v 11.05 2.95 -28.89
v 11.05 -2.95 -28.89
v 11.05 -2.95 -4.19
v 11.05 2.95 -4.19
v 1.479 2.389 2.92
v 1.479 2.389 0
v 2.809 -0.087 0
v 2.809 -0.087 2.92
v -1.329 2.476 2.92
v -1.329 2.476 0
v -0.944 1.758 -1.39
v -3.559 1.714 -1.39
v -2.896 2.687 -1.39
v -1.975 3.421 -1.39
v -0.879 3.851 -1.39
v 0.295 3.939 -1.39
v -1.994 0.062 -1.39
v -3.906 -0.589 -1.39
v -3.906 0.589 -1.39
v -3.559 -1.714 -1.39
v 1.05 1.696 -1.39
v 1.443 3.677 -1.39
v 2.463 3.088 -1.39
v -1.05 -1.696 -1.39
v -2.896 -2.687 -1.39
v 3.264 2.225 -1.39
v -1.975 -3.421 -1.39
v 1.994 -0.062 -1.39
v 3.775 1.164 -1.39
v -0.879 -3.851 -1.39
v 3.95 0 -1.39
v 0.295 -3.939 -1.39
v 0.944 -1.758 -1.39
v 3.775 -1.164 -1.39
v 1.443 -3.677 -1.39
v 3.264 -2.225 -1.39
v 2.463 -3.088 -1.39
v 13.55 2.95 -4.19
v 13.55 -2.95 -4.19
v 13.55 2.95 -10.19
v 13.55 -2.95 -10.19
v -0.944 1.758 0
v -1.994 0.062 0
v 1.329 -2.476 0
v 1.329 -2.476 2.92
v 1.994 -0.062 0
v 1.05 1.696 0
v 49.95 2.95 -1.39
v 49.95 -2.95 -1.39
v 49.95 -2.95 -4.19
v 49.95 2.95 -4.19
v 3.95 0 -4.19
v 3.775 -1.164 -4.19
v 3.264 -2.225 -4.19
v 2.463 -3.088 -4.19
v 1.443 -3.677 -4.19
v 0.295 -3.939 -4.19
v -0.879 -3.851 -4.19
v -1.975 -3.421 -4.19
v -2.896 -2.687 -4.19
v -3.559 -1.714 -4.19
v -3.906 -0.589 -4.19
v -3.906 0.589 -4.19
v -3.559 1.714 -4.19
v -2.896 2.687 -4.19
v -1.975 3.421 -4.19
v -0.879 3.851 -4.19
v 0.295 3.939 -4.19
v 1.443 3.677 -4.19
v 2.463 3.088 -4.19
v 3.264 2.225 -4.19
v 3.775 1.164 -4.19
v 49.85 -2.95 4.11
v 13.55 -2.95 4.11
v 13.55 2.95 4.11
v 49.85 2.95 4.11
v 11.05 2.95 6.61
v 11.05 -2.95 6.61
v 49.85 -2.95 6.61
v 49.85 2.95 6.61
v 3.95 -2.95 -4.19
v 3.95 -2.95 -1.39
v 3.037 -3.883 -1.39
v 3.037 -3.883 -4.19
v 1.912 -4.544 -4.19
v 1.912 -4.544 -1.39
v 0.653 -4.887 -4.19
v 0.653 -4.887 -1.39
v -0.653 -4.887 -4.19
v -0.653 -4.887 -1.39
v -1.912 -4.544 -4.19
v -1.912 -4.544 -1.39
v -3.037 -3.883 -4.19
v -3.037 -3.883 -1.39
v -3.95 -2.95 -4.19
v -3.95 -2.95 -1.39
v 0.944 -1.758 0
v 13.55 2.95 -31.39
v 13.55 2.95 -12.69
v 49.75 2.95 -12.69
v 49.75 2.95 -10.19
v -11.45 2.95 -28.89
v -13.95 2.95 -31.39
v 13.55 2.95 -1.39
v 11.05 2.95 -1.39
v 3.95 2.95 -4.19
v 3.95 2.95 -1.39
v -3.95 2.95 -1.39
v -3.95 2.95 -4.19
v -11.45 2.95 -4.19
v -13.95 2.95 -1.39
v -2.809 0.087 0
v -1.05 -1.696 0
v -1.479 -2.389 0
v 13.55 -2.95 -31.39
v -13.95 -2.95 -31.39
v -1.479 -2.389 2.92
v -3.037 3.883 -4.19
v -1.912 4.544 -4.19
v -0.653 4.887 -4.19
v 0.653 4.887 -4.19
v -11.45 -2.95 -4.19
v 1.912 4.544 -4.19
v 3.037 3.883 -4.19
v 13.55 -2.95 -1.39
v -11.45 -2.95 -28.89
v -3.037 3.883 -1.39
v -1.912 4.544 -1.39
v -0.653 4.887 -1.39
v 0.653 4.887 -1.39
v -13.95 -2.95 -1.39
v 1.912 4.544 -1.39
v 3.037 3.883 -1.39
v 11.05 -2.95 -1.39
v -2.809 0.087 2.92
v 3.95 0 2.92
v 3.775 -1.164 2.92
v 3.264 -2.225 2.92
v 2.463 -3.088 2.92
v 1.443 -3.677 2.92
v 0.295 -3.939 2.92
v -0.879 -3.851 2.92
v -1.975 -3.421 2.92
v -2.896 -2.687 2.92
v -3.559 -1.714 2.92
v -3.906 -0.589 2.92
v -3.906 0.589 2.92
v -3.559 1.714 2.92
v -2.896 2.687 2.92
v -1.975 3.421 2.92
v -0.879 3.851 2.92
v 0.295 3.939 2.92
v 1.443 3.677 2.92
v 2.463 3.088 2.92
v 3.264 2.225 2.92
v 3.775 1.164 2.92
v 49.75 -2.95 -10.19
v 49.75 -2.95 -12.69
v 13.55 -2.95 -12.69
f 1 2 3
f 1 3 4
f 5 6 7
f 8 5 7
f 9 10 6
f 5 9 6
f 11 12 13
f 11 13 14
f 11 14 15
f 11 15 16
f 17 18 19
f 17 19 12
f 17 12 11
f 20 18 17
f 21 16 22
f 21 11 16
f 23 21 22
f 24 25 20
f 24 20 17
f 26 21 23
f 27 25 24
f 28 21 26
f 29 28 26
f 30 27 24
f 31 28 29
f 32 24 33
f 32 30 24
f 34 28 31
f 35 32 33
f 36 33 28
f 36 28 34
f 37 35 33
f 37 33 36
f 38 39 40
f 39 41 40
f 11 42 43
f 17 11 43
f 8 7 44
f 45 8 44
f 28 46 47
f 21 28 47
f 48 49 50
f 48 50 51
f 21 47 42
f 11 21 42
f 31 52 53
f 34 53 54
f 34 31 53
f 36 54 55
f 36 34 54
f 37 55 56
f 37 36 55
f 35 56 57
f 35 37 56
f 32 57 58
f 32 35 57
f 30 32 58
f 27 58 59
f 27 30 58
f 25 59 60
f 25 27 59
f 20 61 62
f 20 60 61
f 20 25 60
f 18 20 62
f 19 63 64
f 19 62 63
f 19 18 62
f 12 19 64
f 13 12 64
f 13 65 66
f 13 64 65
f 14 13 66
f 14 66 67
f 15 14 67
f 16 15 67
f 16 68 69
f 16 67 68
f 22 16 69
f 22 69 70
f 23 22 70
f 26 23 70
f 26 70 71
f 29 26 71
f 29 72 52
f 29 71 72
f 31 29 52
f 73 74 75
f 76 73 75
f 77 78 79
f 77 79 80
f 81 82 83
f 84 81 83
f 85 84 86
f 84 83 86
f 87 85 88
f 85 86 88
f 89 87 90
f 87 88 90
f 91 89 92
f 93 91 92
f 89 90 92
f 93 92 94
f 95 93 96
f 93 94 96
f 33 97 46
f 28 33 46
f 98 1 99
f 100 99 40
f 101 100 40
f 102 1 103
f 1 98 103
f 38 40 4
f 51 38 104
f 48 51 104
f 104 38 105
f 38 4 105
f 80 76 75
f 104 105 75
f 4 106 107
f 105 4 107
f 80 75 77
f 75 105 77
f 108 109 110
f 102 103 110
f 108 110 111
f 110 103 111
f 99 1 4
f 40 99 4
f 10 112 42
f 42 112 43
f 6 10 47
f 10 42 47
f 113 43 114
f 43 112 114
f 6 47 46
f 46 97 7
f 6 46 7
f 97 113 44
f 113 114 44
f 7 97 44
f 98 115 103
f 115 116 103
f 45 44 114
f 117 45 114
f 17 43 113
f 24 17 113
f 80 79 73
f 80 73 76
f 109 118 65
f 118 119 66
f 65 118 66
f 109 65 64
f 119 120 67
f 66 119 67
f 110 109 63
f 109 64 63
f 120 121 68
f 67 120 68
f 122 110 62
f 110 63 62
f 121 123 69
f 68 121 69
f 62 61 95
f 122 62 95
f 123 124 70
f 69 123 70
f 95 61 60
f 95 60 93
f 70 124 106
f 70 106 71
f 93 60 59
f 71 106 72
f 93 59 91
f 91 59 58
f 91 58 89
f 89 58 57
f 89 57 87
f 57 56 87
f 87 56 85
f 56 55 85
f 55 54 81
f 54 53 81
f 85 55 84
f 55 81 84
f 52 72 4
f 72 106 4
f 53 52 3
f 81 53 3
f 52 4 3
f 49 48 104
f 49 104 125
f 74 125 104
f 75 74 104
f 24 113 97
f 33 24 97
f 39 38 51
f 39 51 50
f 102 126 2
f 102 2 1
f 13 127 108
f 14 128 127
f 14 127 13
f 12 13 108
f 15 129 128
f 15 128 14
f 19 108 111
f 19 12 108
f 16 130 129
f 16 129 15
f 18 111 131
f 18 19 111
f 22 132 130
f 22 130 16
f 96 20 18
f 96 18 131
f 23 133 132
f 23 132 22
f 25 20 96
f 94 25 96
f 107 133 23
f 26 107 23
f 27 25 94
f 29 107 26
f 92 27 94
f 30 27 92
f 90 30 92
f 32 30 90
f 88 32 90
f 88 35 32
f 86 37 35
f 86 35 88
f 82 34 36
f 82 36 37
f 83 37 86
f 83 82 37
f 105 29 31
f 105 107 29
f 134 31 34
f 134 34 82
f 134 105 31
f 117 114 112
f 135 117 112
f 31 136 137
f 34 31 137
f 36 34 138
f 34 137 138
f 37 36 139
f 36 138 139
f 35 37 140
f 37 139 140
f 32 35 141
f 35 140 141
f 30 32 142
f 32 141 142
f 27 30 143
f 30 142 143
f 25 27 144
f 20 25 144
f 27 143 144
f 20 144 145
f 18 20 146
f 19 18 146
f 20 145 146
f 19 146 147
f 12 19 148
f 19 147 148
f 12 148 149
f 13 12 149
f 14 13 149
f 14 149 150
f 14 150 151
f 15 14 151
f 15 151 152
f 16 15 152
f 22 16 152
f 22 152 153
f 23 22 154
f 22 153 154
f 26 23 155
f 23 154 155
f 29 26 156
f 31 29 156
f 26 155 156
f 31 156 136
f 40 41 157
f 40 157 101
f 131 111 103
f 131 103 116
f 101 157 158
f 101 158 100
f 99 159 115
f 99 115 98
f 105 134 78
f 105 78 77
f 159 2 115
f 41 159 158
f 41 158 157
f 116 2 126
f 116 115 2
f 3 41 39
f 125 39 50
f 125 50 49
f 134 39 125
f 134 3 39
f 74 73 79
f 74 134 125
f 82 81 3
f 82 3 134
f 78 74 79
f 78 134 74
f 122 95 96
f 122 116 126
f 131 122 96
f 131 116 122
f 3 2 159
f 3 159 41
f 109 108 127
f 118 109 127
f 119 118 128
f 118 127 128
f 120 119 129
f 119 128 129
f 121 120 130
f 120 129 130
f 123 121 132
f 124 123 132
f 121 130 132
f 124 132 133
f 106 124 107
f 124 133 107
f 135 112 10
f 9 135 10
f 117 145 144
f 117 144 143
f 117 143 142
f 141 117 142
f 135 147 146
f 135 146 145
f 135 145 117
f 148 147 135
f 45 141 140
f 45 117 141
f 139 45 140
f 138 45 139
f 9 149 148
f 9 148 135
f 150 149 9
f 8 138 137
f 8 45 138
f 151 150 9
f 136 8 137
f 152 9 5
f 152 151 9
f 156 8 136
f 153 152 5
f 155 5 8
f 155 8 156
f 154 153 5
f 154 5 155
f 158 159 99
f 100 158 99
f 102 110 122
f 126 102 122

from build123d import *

# Parameters (mm, degrees)
F0_R      = 3.95
F1_DEPTH  = 2.92
F2_R      = 3.95
F3_DEPTH  = 3.91
F4_DEPTH  = 2.52
F5_R      = 4.93
F5_R_2    = 3.95
F6_DEPTH  = 2.8
F7_DEPTH  = 25
F12_W     = 5.8999661016
F12_H     = 2.8
F13_DEPTH = 46
F14_W     = 5.8999661016
F14_H     = 2.8
F15_DEPTH = 7.5
F16_W     = 5.8999661016
F16_H     = 30
F17_DEPTH = 2.5
F18_W     = 5.8999661016
F18_H     = 2.5
F19_DEPTH = 25
F20_W     = 2.5
F20_H     = 5.8999661016
F21_DEPTH = 25.7
F22_W     = 5.8999661016
F22_H     = 2.5
F23_DEPTH = 36.2
F24_W     = 2.5
F24_H     = 5.8999661016
F25_DEPTH = 8
F26_W     = 5.8999661016
F26_H     = 2.5
F27_DEPTH = 36.3


with BuildPart() as f1:
    # F0 (on Top) → F1 (new body)
    with BuildSketch(Plane.XY):
        Circle(F0_R)
        Polygon((-1.3292084984, 2.4757432758), (1.4794523209, 2.3889999645), (2.8086608193, -0.0867433114), (1.3292084984, -2.4757432758), (-1.4794523209, -2.3889999645), (-2.8086608193, 0.0867433114), align=None, mode=Mode.SUBTRACT)
    extrude(amount=F1_DEPTH)

    # F2 (on face) → F3 (join)
    with BuildSketch(Plane(origin=(0, 0, 0), x_dir=(1, 0, 0), z_dir=(0, 0, -1))):
        Circle(F2_R)
        Polygon((-1.4794523209, 2.3889999645), (1.3292084984, 2.4757432758), (2.8086608193, 0.0867433114), (1.4794523209, -2.3889999645), (-1.3292084984, -2.4757432758), (-2.8086608193, -0.0867433114), align=None, mode=Mode.SUBTRACT)
        Polygon((2.8086608193, 0.0867433114), (1.3292084984, 2.4757432758), (-1.4794523209, 2.3889999645), (-2.8086608193, -0.0867433114), (-1.3292084984, -2.4757432758), (1.4794523209, -2.3889999645), align=None)
        Polygon((-1.0503584983, 1.696104957), (0.9436907311, 1.7576896211), (1.9940492294, 0.0615846641), (1.0503584983, -1.696104957), (-0.9436907311, -1.7576896211), (-1.9940492294, -0.0615846641), align=None, mode=Mode.SUBTRACT)
    extrude(amount=F3_DEPTH)

    # F4 (cut): a face of the model
    f4_faces = [f1.faces().sort_by_distance(p)[0] for p in [
        (-3.8382771286, 0, -3.91),
    ]]
    extrude(f4_faces, amount=-F4_DEPTH, mode=Mode.SUBTRACT)

    # F5 (on face) → F6 (join)
    with BuildSketch(Plane(origin=(0, 0, -1.39), x_dir=(1, 0, 0), z_dir=(0, 0, -1))):
        Circle(F5_R)
        Circle(F5_R_2, mode=Mode.SUBTRACT)
    extrude(amount=F6_DEPTH)

    # F5 (on face) → F7 (cut)
    with BuildSketch(Plane(origin=(0, 0, -1.39), x_dir=(1, 0, 0), z_dir=(0, 0, -1))):
        Circle(F5_R_2)
        Polygon((1.0503584983, -1.696104957), (-0.9436907311, -1.7576896211), (-1.9940492294, -0.0615846641), (-1.0503584983, 1.696104957), (0.9436907311, 1.7576896211), (1.9940492294, 0.0615846641), align=None, mode=Mode.SUBTRACT)
    extrude(amount=F7_DEPTH, mode=Mode.SUBTRACT)

    # F12 (on 3pt) → F13 (join)
    with BuildSketch(Plane.YZ.offset(3.95)):
        with Locations((0, -2.79)):
            Rectangle(F12_W, F12_H)
    extrude(amount=F13_DEPTH)

    # F14 (on 3pt) → F15 (join)
    with BuildSketch(Plane(origin=(-3.95, 0, 0), x_dir=(0, -1, 0), z_dir=(-1, 0, 0))):
        with Locations((0, -2.79)):
            Rectangle(F14_W, F14_H)
    extrude(amount=F15_DEPTH)

    # F16 (on face) → F17 (join)
    with BuildSketch(Plane(origin=(-11.45, 0, 0), x_dir=(0, -1, 0), z_dir=(-1, 0, 0))):
        with Locations((0, -16.39)):
            Rectangle(F16_W, F16_H)
    extrude(amount=F17_DEPTH)

    # F18 (on face) → F19 (join)
    with BuildSketch(Plane.YZ.offset(-11.45)):
        with Locations((0, -30.14)):
            Rectangle(F18_W, F18_H)
    extrude(amount=F19_DEPTH)

    # F20 (on face) → F21 (join)
    with BuildSketch(Plane.XY.offset(-28.89)):
        with Locations((12.3, 0)):
            Rectangle(F20_W, F20_H)
    extrude(amount=F21_DEPTH)

    # F22 (on face) → F23 (join)
    with BuildSketch(Plane.YZ.offset(13.55)):
        with Locations((0, -11.44)):
            Rectangle(F22_W, F22_H)
    extrude(amount=F23_DEPTH)

    # F24 (on face) → F25 (join)
    with BuildSketch(Plane.XY.offset(-1.39)):
        with Locations((12.3, 0)):
            Rectangle(F24_W, F24_H)
    extrude(amount=F25_DEPTH)

    # F26 (on face) → F27 (join)
    with BuildSketch(Plane.YZ.offset(13.55)):
        with Locations((0, 5.36)):
            Rectangle(F26_W, F26_H)
    extrude(amount=F27_DEPTH)


solid = f1.part
